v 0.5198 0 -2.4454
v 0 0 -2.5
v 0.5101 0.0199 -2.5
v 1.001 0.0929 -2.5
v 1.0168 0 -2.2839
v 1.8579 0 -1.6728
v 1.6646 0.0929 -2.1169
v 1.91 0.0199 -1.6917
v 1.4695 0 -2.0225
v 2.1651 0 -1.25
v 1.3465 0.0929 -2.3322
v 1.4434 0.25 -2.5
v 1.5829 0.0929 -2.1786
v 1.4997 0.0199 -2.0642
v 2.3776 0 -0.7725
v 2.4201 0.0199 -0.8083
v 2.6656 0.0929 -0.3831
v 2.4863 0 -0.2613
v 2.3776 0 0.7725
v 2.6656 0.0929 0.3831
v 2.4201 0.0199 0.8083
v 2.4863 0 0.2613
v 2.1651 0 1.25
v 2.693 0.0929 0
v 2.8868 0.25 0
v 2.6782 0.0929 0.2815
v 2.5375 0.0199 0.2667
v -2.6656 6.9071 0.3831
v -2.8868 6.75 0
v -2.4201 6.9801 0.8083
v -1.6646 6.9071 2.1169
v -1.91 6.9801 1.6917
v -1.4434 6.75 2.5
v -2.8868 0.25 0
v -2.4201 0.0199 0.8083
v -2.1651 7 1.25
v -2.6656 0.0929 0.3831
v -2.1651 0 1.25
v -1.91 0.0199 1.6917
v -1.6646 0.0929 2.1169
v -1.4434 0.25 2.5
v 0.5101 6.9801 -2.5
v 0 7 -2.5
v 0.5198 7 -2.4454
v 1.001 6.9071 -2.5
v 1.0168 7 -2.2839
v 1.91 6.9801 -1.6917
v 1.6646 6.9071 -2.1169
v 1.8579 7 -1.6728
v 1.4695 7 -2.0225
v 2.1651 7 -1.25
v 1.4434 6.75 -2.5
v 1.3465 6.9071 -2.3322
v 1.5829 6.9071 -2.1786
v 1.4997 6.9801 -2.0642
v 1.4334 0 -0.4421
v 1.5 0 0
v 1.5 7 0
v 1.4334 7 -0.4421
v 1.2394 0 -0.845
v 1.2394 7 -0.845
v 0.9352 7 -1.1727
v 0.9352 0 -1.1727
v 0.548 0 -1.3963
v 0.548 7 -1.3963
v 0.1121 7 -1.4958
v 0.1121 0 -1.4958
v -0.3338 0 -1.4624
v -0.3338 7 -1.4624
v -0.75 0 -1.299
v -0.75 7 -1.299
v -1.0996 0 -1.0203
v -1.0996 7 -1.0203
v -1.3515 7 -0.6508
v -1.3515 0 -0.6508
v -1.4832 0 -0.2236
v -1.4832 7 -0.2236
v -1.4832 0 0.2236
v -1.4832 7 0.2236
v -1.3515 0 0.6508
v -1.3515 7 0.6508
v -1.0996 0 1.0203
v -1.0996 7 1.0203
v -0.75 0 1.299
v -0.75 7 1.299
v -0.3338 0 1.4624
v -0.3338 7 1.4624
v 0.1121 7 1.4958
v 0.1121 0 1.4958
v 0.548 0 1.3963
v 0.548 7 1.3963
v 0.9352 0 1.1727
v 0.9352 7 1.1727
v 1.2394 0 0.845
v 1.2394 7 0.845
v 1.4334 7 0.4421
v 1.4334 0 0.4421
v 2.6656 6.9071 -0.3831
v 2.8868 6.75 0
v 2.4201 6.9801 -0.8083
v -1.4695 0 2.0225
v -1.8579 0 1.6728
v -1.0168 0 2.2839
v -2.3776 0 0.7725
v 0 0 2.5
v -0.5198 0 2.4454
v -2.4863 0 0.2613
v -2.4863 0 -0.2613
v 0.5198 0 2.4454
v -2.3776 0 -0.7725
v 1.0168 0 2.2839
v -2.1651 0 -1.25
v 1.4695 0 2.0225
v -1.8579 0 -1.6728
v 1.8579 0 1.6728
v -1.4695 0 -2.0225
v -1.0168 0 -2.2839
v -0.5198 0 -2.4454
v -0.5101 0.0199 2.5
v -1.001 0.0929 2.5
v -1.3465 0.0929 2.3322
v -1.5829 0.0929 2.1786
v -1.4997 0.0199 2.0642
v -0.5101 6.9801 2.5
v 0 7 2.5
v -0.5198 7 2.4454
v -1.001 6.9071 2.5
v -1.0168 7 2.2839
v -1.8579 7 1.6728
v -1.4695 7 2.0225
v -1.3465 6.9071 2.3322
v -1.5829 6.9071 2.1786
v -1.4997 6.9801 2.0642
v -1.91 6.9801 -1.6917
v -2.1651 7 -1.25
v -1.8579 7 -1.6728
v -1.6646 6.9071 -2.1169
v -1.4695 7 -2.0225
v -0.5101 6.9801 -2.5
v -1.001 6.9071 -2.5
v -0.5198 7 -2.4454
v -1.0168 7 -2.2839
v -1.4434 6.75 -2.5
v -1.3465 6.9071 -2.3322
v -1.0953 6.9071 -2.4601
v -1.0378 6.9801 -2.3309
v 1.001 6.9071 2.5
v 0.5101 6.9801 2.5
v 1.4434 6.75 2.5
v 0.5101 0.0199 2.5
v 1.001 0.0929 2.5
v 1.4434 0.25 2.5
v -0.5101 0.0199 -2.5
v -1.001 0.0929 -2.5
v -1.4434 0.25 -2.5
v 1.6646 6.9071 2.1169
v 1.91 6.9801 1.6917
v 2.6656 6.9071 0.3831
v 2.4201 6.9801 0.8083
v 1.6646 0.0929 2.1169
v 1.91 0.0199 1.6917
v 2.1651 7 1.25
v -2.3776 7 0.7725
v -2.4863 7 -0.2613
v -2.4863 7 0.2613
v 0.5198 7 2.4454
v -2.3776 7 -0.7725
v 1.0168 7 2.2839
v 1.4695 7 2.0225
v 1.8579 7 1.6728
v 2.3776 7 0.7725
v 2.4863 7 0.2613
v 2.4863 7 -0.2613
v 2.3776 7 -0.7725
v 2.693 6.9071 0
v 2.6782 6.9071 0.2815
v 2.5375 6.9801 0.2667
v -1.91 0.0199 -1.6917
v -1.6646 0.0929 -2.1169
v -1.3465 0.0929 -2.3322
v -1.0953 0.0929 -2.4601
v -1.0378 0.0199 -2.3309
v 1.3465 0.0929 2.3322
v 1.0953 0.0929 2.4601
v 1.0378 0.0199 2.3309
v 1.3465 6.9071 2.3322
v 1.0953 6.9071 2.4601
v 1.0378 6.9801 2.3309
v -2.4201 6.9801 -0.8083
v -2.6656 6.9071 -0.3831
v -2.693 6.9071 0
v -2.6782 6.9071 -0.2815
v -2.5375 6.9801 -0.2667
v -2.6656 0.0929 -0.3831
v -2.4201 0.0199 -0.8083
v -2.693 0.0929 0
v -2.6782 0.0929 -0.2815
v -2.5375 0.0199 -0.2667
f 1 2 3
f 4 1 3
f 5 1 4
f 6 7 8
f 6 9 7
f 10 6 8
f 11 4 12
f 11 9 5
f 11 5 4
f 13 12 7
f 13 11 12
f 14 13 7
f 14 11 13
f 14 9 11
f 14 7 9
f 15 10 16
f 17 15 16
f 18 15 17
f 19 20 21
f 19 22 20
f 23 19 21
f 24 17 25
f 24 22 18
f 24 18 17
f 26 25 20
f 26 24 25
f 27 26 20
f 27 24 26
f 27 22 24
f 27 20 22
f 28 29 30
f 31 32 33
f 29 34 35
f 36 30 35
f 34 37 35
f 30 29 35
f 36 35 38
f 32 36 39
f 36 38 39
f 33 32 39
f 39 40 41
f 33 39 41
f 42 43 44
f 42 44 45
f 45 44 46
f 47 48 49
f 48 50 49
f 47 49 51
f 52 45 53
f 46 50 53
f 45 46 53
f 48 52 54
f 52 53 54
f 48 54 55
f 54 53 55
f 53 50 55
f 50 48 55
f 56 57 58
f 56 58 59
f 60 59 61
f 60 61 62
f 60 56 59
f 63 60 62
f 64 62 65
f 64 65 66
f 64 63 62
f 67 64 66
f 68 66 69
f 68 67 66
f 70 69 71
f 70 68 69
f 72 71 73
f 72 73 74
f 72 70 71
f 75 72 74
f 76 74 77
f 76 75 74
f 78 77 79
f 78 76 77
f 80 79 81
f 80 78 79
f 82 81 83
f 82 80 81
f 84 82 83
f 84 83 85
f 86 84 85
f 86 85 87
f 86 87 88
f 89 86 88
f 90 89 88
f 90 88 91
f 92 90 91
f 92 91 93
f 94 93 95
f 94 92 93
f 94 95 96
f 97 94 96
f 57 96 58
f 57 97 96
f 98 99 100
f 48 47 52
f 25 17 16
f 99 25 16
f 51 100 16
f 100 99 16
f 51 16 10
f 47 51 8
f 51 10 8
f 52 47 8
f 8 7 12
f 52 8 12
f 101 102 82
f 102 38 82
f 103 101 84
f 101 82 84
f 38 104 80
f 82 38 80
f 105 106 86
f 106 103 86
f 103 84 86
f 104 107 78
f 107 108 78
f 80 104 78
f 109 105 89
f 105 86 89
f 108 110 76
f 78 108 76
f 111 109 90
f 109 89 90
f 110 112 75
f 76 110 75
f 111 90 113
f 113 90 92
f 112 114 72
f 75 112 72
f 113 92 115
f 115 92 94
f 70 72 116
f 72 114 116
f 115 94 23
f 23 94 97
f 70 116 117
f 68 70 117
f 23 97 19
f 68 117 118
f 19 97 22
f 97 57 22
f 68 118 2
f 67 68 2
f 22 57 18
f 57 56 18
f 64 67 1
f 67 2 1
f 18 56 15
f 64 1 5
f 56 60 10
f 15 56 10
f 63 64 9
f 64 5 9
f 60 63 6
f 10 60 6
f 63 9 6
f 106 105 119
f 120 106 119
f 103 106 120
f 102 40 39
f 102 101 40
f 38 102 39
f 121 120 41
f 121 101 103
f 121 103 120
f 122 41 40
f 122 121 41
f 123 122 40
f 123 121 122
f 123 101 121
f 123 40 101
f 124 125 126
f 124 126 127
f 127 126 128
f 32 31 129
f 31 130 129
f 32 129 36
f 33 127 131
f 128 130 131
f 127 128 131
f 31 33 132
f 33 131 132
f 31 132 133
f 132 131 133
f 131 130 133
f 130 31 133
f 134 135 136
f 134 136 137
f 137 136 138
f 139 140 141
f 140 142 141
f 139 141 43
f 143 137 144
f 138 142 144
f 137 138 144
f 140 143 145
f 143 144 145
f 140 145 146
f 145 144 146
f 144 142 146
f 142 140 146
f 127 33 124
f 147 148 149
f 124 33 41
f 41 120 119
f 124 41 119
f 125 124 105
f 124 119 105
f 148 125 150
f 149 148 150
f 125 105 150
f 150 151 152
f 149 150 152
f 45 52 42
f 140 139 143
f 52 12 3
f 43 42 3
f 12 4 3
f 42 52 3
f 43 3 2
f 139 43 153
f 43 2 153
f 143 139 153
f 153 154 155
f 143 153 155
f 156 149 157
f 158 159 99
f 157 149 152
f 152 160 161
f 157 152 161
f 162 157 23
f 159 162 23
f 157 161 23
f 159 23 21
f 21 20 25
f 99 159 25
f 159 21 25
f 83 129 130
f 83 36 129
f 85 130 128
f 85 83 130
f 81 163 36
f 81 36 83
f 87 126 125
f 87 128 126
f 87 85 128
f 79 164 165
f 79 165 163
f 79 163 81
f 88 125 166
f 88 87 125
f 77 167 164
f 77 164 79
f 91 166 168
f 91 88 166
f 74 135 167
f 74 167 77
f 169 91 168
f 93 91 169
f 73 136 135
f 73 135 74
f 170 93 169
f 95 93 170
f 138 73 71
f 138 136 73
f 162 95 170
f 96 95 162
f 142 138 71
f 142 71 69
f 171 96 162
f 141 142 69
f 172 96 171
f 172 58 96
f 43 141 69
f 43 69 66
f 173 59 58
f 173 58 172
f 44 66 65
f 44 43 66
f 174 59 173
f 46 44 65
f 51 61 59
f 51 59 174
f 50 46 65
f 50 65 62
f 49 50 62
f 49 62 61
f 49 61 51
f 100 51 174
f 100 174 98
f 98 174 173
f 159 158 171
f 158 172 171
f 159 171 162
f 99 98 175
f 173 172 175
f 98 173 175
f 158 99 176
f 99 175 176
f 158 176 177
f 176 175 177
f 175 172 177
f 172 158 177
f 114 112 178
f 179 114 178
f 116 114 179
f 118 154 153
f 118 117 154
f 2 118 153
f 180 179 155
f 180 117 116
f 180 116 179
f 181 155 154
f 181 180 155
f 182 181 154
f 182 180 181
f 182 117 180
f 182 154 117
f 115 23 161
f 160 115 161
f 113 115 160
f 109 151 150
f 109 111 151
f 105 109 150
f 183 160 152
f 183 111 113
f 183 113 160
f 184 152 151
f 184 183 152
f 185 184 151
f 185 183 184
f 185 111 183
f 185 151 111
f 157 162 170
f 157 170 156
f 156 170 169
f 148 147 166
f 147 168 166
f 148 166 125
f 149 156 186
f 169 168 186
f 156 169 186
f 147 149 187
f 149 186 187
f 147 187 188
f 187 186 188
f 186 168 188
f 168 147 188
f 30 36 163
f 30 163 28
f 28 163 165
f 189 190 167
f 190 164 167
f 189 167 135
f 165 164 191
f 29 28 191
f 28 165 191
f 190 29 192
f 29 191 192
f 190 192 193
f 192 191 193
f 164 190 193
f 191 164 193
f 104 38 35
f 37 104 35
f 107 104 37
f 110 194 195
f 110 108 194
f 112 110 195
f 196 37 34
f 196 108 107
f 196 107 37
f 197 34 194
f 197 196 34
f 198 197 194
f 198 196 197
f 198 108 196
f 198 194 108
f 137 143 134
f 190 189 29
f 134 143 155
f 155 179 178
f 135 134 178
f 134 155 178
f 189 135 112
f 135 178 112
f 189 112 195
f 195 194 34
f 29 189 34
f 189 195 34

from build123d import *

# Parameters (mm, degrees)
SKETCH1_R           = 1.5
BOSS_EXTRUDE1_DEPTH = 7


with BuildPart() as part:
    # Sketch1 → Boss-Extrude1 (new body)
    with BuildSketch(Plane(origin=(0, 0, 0), x_dir=(1, 0, 0), z_dir=(0, 1, 0))):
        Polygon((2.886751346, 0), (1.443375673, 2.5), (-1.443375673, 2.5), (-2.886751346, 0), (-1.443375673, -2.5), (1.443375673, -2.5), align=None)
        Circle(SKETCH1_R, mode=Mode.SUBTRACT)
    extrude(amount=BOSS_EXTRUDE1_DEPTH)

    # Sketch5 → Cut-Revolve4 (revolve, cut)
    with BuildSketch(Plane.XY):
        with BuildLine():
            Line((-2.5, 0), (-2.886751346, 0))
            Line((-2.886751346, 0), (-2.886751346, 0.25))
            ThreePointArc((-2.886751346, 0.25), (-2.707962836, 0.102433581), (-2.5, 0))
        make_face()
        with BuildLine():
            Line((-2.886751346, 7), (-2.886751346, 6.75))
            ThreePointArc((-2.886751346, 6.75), (-2.707962836, 6.897566419), (-2.5, 7))
            Line((-2.5, 7), (-2.886751346, 7))
        make_face()
    revolve(axis=Axis((0, 7.426750378, 0), (0, -1, 0)), mode=Mode.SUBTRACT)


solid = part.part
